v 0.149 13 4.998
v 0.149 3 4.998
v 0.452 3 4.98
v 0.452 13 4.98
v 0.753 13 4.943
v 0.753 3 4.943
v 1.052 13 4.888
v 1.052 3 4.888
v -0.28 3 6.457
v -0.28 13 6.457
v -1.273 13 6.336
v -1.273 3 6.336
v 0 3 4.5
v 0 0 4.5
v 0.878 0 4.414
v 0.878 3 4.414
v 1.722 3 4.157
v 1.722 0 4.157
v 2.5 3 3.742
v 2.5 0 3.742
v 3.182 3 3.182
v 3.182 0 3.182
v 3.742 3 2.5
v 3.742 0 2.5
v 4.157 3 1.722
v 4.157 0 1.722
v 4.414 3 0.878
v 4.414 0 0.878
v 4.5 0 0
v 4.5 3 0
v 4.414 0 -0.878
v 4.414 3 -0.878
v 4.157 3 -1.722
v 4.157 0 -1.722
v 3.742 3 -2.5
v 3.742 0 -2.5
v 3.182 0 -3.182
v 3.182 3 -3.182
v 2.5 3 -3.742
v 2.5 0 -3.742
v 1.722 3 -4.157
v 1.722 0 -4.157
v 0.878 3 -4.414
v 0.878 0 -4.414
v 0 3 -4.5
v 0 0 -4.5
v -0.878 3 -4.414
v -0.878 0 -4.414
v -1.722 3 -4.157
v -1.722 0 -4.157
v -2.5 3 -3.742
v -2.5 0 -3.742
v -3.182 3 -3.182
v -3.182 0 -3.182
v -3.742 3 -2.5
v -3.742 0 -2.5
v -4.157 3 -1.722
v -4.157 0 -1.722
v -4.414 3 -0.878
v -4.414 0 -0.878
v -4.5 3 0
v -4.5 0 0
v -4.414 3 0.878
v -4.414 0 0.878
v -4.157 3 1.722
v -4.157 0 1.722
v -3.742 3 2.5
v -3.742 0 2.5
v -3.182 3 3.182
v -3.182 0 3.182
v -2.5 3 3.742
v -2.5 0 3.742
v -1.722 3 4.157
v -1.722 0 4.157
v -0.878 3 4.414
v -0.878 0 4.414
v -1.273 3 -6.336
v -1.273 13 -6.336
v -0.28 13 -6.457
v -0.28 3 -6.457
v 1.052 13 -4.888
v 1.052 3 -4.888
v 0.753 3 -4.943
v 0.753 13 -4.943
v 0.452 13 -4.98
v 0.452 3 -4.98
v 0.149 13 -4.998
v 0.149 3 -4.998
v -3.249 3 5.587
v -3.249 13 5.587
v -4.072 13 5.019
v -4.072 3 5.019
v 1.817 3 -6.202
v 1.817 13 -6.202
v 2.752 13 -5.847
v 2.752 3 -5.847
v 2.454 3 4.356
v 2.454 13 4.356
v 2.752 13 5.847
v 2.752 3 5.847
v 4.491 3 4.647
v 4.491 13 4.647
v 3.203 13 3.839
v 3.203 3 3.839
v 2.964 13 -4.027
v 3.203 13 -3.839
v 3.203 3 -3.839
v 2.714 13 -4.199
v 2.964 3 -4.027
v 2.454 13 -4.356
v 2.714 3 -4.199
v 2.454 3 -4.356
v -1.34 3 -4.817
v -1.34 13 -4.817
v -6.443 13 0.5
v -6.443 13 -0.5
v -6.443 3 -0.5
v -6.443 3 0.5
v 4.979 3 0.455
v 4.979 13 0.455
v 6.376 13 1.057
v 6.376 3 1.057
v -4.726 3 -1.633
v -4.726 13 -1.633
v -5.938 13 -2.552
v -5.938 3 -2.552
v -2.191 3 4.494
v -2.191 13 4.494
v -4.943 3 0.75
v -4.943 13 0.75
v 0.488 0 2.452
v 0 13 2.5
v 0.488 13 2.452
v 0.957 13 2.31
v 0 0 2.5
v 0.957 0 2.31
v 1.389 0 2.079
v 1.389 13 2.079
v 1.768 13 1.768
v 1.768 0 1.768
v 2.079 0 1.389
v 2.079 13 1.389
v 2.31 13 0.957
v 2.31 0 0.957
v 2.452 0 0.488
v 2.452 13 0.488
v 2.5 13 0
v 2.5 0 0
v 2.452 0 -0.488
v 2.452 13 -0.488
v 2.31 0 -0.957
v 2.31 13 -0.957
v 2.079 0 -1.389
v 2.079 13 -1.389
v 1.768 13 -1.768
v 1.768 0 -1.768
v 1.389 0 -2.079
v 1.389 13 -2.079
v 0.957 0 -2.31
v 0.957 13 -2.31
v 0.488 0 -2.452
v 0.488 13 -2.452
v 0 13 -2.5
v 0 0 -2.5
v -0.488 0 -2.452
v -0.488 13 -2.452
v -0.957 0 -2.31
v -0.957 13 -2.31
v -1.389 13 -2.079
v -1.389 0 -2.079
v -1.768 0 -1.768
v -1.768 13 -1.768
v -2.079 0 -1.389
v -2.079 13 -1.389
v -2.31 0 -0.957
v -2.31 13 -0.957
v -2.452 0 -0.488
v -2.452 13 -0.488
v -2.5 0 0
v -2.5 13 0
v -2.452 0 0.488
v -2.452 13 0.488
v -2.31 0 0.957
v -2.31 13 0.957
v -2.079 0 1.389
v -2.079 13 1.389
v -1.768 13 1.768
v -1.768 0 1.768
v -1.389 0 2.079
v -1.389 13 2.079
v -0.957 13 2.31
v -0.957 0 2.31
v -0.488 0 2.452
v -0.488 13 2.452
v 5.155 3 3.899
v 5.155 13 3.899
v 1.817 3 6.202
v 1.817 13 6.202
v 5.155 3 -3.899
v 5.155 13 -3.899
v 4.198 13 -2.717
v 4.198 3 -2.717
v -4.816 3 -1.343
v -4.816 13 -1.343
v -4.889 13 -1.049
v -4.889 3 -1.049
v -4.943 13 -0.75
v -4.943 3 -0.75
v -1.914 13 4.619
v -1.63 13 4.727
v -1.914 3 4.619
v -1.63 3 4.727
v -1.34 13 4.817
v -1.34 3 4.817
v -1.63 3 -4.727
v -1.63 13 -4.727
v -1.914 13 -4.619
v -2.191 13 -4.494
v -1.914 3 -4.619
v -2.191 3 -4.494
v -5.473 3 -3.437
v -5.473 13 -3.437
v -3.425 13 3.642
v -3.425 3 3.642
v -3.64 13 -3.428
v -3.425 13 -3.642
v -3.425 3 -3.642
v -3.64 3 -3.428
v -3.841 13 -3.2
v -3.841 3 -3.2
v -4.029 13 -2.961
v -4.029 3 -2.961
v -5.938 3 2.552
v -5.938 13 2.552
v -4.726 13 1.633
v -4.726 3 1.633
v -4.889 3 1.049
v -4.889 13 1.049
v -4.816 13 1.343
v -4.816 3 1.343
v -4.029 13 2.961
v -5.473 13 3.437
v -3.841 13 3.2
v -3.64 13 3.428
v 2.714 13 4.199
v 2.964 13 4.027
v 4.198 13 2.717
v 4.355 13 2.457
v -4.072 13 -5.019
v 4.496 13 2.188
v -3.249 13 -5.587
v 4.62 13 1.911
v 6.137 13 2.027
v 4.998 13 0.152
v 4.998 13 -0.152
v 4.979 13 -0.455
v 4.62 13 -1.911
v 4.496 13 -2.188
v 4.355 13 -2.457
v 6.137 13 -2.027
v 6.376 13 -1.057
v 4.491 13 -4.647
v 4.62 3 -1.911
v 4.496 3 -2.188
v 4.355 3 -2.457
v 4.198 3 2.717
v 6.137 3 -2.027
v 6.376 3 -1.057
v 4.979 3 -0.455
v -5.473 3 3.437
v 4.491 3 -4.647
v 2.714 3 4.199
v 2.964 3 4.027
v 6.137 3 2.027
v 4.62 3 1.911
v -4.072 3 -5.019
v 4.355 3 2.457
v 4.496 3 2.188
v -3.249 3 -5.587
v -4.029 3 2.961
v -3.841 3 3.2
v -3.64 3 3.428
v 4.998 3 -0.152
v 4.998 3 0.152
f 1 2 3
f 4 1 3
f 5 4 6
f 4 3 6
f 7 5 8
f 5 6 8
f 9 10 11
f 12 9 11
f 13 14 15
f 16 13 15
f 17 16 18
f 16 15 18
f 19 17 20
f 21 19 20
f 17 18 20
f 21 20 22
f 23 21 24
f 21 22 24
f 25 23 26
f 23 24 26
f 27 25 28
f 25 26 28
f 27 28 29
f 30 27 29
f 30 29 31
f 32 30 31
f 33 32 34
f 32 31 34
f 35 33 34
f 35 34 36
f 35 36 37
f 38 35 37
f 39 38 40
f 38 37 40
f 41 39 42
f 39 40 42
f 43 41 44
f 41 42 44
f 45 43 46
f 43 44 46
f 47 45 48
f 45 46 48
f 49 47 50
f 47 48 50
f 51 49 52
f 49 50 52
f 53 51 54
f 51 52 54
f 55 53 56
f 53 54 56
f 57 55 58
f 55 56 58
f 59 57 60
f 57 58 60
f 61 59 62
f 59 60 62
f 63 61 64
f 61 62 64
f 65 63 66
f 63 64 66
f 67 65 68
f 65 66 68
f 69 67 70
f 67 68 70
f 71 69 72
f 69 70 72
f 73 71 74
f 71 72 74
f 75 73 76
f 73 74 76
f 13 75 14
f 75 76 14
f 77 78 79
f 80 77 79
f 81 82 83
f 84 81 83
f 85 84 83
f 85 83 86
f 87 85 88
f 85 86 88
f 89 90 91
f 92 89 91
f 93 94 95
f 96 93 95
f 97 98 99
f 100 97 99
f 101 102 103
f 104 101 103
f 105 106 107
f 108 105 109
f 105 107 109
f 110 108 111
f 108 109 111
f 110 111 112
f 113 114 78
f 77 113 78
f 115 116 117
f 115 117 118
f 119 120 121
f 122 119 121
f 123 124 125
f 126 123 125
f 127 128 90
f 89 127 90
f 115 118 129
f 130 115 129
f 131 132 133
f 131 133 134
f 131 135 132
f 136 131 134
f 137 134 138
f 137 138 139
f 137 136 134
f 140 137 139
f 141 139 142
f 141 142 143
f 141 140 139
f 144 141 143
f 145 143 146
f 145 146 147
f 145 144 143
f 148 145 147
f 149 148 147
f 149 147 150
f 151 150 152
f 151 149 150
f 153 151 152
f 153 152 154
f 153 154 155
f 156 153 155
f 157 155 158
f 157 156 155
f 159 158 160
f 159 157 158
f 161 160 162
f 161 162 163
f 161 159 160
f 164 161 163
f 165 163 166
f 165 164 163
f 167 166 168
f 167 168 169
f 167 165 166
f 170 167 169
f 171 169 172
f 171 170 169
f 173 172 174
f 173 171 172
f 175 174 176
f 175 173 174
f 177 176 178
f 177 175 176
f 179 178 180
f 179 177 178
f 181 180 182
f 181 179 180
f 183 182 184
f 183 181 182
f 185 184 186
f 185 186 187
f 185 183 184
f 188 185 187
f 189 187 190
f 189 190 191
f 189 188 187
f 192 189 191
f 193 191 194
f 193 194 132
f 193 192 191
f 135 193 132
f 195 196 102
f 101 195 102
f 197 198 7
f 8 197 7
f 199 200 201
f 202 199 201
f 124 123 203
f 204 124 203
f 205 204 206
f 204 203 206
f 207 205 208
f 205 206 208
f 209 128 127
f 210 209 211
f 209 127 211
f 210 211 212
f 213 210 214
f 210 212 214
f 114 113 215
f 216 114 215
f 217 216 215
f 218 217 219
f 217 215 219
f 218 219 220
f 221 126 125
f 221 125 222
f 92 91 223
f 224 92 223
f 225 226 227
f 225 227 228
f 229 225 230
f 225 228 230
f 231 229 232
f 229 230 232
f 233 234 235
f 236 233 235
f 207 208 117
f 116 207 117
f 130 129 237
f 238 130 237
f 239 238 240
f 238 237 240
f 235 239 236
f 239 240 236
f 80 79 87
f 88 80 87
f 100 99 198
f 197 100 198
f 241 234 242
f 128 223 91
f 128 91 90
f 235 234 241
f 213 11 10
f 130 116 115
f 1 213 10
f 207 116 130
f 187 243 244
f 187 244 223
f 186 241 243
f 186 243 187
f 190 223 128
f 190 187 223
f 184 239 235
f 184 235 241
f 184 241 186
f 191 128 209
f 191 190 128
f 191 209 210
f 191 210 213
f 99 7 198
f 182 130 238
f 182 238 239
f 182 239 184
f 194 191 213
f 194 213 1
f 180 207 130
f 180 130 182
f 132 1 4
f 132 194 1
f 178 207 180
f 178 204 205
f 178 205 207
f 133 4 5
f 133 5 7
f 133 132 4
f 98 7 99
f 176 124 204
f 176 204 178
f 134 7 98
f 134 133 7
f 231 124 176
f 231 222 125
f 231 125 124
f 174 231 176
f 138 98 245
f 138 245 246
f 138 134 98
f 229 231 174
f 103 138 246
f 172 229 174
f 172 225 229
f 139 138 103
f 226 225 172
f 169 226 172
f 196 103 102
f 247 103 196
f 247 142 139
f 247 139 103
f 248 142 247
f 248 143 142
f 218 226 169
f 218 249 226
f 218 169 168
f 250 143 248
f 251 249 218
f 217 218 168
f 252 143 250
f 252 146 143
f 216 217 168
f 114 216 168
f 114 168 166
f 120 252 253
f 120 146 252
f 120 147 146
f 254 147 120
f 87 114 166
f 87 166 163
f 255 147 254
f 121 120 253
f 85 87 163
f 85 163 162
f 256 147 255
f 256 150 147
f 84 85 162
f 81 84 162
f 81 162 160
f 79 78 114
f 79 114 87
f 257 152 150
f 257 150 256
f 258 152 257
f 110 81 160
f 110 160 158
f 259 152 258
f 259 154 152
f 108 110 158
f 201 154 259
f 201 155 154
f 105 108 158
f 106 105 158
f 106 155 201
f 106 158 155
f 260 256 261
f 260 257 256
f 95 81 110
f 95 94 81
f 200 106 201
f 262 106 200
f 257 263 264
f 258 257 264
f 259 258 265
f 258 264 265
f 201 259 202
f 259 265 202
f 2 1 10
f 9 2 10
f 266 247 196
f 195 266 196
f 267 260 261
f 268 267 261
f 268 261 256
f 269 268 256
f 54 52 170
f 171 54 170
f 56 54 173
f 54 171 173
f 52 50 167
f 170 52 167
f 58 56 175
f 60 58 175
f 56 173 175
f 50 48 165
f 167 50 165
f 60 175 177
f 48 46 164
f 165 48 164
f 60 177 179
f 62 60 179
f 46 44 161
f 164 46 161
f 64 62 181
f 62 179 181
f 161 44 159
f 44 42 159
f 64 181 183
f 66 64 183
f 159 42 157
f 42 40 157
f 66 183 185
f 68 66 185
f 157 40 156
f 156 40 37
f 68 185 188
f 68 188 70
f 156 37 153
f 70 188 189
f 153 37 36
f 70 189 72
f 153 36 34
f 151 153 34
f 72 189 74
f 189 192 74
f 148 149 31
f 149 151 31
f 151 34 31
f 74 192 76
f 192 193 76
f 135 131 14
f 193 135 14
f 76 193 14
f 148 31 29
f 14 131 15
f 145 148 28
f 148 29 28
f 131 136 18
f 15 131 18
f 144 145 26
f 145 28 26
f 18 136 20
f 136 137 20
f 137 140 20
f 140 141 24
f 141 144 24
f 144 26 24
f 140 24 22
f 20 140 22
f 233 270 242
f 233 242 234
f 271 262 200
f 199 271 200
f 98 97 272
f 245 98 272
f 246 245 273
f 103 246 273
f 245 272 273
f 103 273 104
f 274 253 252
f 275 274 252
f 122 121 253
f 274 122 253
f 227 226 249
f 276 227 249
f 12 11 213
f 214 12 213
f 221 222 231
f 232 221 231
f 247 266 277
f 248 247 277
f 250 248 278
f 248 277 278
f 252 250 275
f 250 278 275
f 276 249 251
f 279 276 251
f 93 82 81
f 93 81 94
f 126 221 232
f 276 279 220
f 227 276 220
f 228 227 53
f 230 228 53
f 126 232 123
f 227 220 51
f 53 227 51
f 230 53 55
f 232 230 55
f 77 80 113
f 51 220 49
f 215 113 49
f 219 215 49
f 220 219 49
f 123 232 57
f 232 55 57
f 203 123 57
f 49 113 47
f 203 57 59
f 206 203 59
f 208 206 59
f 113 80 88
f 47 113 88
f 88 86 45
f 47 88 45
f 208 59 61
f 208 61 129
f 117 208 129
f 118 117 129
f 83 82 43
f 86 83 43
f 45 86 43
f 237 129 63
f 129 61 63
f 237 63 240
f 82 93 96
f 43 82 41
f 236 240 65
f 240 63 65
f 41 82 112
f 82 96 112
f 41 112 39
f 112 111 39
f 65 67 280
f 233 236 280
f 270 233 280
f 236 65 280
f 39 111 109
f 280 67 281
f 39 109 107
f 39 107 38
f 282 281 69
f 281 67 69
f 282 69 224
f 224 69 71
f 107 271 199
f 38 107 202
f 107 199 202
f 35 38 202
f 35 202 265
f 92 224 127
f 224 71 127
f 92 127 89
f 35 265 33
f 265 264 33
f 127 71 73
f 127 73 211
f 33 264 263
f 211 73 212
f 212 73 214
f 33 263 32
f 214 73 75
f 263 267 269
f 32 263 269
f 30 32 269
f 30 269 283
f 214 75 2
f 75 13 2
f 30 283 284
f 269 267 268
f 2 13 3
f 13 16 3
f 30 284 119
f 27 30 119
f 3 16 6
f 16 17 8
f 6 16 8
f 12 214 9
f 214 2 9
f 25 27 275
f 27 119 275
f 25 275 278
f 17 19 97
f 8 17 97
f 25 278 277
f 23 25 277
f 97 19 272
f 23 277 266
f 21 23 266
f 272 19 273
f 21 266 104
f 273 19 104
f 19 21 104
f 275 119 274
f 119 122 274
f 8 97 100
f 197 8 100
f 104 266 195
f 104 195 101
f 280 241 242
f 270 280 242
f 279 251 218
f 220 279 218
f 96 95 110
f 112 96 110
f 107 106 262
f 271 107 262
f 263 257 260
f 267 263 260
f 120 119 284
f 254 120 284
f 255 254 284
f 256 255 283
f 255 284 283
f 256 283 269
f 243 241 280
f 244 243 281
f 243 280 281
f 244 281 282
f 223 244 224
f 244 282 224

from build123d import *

# Parameters (mm, degrees)
SKETCH1_R           = 4.5
SKETCH1_R_2         = 2.5
BOSS_EXTRUDE1_DEPTH = 3
SKETCH2_R           = 5
SKETCH2_R_2         = 2.5
BOSS_EXTRUDE2_DEPTH = 10
BOSS_EXTRUDE3_DEPTH = 10


with BuildPart() as part:
    # Sketch1 → Boss-Extrude1 (new body)
    with BuildSketch(Plane(origin=(0, 0, 0), x_dir=(1, 0, 0), z_dir=(0, 1, 0))):
        with Locations(Location((0, 0, 0), (0, 0, 270))):
            Circle(SKETCH1_R)
        with Locations(Location((0, 0, 0), (0, 0, 270))):
            Circle(SKETCH1_R_2, mode=Mode.SUBTRACT)
    extrude(amount=BOSS_EXTRUDE1_DEPTH)

    # Sketch2 → Boss-Extrude2 (add)
    with BuildSketch(Plane(origin=(0, 3, 0), x_dir=(1, 0, 0), z_dir=(0, 1, 0))):
        with Locations(Location((0, 0, 0), (0, 0, 270))):
            Circle(SKETCH2_R)
        with Locations(Location((0, 0, 0), (0, 0, 270))):
            Circle(SKETCH2_R_2, mode=Mode.SUBTRACT)
    extrude(amount=BOSS_EXTRUDE2_DEPTH)

    # Sketch3 → Boss-Extrude3 (add)
    with BuildSketch(Plane(origin=(0, 13, 0), x_dir=(1, 0, 0), z_dir=(0, 1, 0))):
        Polygon((-4.943429983, -0.75), (-4.943429983, 0.75), (-6.443429983, 0.5), (-6.443429983, -0.5), align=None)
        Polygon((-5.473012319, 3.437139234), (-4.028647487, 2.961418482), (-4.725732245, 1.633234443), (-5.937735491, 2.551683208), align=None)
        Polygon((-3.248793489, 5.586871291), (-2.190950402, 4.494411678), (-3.425426201, 3.642314558), (-4.071777355, 5.018806544), align=None)
        Polygon((-0.280315223, 6.456718464), (0.148667016, 4.997789323), (-1.340396295, 4.816984303), (-1.273024097, 6.336181784), align=None)
        Polygon((2.752379883, 5.847409249), (2.454226613, 4.356233664), (1.051702249, 4.888140994), (1.81736364, 6.202014137), align=None)
        Polygon((5.154537927, 3.898529045), (4.197552469, 2.71671737), (3.202868482, 3.839483492), (4.491415268, 4.647039793), align=None)
        Polygon((6.375853451, 1.056542818), (4.979269641, 0.454833867), (4.620296144, 1.911246593), (6.136537786, 2.027484635), align=None)
        Polygon((6.136537786, -2.027484635), (4.620296144, -1.911246593), (4.979269641, -0.454833867), (6.375853451, -1.056542818), align=None)
        Polygon((4.491415268, -4.647039793), (3.202868482, -3.839483492), (4.197552469, -2.71671737), (5.154537927, -3.898529045), align=None)
        Polygon((1.81736364, -6.202014137), (1.051702249, -4.888140994), (2.454226613, -4.356233664), (2.752379883, -5.847409249), align=None)
        Polygon((-1.273024097, -6.336181784), (-1.340396295, -4.816984303), (0.148667016, -4.997789323), (-0.280315223, -6.456718464), align=None)
        Polygon((-4.071777355, -5.018806544), (-3.425426201, -3.642314558), (-2.190950402, -4.494411678), (-3.248793489, -5.586871291), align=None)
        Polygon((-5.937735491, -2.551683208), (-4.725732245, -1.633234443), (-4.028647487, -2.961418482), (-5.473012319, -3.437139234), align=None)
    extrude(amount=-BOSS_EXTRUDE3_DEPTH)


solid = part.part
